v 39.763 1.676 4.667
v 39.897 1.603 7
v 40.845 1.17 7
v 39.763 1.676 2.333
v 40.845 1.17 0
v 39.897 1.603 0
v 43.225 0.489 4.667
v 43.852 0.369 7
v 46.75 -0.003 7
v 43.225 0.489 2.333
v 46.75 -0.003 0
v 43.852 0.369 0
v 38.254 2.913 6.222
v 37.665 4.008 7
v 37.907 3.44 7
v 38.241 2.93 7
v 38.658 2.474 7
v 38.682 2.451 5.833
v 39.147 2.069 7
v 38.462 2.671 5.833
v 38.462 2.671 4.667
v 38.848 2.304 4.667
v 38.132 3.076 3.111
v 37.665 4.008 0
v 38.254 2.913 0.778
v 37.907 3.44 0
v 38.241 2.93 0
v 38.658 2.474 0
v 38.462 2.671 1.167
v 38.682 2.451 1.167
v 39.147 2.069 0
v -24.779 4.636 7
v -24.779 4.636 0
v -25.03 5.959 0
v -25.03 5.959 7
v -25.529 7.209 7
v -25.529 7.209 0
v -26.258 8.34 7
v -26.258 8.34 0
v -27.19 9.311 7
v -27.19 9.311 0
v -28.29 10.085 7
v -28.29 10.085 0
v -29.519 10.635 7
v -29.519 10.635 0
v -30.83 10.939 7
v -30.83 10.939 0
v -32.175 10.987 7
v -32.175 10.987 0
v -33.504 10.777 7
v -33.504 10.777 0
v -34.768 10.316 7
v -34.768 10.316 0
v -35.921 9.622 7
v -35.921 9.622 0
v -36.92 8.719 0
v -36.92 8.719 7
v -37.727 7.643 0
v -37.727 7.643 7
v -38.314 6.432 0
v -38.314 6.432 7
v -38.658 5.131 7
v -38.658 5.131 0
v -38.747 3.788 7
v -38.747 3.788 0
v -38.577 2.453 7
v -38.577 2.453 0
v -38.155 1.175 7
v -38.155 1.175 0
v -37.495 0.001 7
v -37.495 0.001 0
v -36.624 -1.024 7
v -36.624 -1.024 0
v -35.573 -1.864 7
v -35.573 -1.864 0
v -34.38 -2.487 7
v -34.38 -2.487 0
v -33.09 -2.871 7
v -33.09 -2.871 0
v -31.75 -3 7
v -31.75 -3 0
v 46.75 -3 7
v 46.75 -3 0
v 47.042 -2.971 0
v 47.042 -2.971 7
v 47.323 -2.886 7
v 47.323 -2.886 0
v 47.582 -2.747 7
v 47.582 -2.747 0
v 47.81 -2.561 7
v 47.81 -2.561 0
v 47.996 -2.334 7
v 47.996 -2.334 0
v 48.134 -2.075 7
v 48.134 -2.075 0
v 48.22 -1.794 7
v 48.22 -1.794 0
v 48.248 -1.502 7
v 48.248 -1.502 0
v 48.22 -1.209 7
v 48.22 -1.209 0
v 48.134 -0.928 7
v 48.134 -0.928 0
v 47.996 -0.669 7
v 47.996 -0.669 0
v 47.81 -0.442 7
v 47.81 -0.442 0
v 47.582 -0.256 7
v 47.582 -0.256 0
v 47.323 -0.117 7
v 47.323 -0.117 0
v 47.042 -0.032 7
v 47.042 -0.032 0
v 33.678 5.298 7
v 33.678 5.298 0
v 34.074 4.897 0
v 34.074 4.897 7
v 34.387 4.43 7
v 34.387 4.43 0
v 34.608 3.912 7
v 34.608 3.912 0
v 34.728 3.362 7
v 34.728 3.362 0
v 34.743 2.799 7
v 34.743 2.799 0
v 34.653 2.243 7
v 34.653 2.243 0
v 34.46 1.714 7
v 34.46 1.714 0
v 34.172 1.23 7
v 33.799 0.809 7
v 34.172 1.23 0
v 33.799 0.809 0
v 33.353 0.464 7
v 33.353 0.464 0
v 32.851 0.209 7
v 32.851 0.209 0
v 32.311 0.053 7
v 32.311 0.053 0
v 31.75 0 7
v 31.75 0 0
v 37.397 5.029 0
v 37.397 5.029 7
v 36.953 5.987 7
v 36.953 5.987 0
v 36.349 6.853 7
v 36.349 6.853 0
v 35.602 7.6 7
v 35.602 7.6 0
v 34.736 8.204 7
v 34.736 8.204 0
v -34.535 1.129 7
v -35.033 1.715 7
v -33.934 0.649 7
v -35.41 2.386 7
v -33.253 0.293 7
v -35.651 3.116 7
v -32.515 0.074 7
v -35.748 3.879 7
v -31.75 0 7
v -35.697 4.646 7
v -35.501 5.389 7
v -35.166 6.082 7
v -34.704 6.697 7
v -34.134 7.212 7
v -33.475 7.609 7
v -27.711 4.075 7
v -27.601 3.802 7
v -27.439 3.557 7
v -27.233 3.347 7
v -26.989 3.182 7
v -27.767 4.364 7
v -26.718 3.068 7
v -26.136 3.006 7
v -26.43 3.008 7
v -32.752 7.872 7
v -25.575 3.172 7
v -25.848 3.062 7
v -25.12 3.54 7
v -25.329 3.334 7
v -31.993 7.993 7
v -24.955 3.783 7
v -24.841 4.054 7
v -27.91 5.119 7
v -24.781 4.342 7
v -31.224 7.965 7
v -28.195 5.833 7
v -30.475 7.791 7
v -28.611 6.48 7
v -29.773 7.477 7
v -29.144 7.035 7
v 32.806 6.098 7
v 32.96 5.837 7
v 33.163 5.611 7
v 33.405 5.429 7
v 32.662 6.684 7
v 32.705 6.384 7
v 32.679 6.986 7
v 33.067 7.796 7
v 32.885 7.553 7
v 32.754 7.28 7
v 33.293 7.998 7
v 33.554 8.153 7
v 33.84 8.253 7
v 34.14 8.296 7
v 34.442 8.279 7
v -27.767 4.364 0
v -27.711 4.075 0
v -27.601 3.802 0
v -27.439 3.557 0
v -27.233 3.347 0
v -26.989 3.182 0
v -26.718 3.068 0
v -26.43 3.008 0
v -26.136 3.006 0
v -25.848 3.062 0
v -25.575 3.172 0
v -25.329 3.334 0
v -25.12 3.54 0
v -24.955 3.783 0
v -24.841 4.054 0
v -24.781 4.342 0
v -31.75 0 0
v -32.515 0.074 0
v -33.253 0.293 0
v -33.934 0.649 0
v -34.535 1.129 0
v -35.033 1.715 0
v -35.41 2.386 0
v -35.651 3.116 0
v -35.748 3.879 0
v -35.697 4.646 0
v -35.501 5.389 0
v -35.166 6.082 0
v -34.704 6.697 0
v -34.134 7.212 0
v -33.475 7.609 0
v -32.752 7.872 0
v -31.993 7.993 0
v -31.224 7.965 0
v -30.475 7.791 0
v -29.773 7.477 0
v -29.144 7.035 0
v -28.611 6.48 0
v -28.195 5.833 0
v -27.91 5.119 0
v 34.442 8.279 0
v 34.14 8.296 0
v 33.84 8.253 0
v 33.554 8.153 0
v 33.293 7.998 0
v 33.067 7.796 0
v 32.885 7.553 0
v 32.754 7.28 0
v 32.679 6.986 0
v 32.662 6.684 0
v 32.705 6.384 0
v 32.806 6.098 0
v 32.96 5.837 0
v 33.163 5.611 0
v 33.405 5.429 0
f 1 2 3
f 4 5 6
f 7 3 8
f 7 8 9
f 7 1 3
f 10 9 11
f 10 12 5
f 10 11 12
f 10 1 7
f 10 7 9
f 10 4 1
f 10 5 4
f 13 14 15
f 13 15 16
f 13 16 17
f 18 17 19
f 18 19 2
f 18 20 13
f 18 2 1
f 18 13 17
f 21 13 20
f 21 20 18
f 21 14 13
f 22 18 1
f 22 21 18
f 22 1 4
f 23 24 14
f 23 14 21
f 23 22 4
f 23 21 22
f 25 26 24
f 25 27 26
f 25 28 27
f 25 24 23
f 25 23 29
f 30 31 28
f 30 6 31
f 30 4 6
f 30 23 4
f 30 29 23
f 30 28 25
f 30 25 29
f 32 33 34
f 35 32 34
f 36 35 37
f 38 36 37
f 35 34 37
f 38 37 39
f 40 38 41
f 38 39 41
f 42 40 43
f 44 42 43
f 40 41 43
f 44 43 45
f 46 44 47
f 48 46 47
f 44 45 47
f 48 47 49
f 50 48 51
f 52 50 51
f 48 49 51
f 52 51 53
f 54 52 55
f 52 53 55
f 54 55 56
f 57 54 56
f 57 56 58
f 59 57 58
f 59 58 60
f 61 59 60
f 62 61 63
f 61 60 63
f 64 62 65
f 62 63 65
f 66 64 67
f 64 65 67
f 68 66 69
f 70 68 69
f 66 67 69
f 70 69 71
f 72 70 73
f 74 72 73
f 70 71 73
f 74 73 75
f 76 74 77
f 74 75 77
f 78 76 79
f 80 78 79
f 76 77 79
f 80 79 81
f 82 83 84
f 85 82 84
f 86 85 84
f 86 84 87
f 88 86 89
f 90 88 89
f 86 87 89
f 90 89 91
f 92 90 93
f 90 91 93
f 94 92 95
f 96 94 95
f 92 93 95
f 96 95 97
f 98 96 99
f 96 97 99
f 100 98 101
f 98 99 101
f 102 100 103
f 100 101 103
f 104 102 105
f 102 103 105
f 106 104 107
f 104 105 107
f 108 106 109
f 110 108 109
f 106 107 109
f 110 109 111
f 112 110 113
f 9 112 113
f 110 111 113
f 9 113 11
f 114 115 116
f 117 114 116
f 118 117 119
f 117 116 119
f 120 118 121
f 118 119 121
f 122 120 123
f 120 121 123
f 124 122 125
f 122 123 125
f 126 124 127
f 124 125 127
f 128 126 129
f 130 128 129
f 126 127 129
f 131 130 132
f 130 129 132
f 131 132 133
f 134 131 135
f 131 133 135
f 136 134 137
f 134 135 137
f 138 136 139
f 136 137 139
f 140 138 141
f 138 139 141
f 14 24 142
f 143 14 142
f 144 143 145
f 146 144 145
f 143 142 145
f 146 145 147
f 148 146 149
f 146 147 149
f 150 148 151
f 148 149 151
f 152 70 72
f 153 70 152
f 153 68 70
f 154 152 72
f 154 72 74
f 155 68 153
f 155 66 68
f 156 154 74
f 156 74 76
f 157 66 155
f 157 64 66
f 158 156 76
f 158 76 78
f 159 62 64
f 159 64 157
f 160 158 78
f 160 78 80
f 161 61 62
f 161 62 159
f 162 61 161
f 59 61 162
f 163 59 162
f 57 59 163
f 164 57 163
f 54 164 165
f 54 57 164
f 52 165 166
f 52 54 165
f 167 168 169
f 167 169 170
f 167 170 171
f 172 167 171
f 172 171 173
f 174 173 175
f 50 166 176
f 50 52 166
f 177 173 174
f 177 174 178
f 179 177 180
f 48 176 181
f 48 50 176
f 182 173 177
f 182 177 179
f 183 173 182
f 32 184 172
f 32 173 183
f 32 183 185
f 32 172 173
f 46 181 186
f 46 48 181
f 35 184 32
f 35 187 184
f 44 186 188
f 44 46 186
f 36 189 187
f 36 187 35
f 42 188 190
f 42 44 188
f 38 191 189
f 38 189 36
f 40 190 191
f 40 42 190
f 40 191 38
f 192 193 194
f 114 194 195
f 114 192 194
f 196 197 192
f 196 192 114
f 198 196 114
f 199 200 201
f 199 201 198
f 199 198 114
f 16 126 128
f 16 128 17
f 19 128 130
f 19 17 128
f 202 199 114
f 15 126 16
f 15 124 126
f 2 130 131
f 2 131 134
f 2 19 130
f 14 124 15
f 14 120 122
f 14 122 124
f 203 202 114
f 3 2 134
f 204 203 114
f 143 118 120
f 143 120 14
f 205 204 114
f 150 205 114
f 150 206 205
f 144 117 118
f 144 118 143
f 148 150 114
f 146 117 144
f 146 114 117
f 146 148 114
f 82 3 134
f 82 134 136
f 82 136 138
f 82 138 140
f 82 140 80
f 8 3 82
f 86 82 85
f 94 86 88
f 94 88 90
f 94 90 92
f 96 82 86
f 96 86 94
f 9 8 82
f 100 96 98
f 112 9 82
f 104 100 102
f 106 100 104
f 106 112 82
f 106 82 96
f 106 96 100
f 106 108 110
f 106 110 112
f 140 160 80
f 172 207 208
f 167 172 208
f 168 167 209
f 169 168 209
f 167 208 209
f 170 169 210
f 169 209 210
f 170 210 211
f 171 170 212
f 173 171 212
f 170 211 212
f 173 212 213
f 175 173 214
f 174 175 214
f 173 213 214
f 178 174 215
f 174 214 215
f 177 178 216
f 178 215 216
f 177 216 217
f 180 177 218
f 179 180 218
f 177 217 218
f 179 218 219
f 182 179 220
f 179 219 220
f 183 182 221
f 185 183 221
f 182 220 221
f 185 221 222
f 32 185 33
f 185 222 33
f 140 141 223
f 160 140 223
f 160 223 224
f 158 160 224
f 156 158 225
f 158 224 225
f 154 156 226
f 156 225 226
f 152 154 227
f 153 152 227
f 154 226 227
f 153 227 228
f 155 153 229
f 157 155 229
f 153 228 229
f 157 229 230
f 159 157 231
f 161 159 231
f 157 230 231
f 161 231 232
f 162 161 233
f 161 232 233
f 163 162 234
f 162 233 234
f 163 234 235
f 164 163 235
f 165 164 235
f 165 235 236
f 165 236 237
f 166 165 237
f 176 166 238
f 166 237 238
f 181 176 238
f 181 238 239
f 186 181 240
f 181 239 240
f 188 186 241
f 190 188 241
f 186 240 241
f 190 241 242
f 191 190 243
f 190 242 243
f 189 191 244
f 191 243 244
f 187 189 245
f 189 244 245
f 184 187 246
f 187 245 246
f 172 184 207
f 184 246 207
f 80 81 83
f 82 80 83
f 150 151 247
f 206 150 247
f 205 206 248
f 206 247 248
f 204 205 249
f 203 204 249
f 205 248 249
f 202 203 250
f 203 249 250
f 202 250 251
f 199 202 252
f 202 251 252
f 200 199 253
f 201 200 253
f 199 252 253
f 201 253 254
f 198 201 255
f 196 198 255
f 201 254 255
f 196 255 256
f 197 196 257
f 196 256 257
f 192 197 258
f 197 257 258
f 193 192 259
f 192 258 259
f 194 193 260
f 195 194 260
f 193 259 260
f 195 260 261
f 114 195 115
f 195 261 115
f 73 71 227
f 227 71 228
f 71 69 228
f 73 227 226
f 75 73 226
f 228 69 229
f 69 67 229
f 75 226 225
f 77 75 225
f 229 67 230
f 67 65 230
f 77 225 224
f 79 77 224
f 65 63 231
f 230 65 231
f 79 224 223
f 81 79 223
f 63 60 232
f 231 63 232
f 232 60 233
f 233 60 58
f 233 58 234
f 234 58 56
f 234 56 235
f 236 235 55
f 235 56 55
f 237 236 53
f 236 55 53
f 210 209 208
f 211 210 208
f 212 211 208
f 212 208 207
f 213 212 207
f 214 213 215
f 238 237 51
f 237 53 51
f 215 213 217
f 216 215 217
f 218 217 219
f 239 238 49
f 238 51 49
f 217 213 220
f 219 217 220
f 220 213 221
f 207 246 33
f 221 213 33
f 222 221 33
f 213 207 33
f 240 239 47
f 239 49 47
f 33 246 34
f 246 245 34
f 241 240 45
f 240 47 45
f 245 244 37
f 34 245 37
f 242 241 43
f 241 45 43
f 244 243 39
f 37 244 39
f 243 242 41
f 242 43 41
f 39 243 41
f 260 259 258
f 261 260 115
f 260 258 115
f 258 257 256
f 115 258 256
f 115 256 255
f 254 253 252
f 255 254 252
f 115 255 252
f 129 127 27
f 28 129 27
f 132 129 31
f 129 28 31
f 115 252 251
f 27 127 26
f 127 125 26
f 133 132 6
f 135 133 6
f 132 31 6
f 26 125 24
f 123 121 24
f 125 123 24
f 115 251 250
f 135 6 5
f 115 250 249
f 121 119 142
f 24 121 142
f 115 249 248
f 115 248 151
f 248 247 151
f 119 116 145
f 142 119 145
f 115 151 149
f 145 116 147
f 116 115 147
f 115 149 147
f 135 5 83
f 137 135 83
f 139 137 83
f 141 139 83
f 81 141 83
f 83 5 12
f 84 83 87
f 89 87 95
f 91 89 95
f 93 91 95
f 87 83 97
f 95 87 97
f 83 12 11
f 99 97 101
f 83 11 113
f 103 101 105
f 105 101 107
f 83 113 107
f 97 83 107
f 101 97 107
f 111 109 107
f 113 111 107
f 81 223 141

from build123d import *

# Parameters (mm, degrees)
F1_DEPTH = 7


with BuildPart() as f1:
    # F0 (on Top) → F1 (new body)
    with BuildSketch(Plane.XY):
        with BuildLine():
            Line((31.75, 0), (-31.75, 0))
            ThreePointArc((-31.75, 0), (-34.704196, 6.696799), (-27.766563, 4.363636))
            ThreePointArc((-27.766563, 4.363636), (-26.136411, 3.006211), (-24.778986, 4.636364))
            ThreePointArc((-24.778986, 4.636364), (-36.919843, 8.719399), (-31.75, -3))
            Line((-31.75, -3), (31.75, -3))
            ThreePointArc((31.75, -3), (36.335039, -0.870066), (37.664802, 4.007528))
            ThreePointArc((37.664802, 4.007528), (36.670299, 6.433753), (34.736073, 8.204168))
            ThreePointArc((34.736073, 8.204168), (32.7542, 7.280006), (33.678363, 5.298133))
            ThreePointArc((33.678363, 5.298133), (34.569078, 1.97394), (31.75, 0))
        make_face()
        with BuildLine():
            add(Edge.make_bspline(
                [(37.664802, 4.007528), (38.646857, 0.955298), (43.6282, 0.290702), (46.75, -0.003234)],
                knots=[0.170737, 0.170737, 0.170737, 0.170737, 10.040086, 10.040086, 10.040086, 10.040086], degree=3))
            ThreePointArc((37.664802, 4.007528), (36.335039, -0.870066), (31.75, -3))
            Line((31.75, -3), (46.75, -3))
            ThreePointArc((46.75, -3), (48.248383, -1.501617), (46.75, -0.003234))
        make_face()
    extrude(amount=F1_DEPTH)


solid = f1.part
